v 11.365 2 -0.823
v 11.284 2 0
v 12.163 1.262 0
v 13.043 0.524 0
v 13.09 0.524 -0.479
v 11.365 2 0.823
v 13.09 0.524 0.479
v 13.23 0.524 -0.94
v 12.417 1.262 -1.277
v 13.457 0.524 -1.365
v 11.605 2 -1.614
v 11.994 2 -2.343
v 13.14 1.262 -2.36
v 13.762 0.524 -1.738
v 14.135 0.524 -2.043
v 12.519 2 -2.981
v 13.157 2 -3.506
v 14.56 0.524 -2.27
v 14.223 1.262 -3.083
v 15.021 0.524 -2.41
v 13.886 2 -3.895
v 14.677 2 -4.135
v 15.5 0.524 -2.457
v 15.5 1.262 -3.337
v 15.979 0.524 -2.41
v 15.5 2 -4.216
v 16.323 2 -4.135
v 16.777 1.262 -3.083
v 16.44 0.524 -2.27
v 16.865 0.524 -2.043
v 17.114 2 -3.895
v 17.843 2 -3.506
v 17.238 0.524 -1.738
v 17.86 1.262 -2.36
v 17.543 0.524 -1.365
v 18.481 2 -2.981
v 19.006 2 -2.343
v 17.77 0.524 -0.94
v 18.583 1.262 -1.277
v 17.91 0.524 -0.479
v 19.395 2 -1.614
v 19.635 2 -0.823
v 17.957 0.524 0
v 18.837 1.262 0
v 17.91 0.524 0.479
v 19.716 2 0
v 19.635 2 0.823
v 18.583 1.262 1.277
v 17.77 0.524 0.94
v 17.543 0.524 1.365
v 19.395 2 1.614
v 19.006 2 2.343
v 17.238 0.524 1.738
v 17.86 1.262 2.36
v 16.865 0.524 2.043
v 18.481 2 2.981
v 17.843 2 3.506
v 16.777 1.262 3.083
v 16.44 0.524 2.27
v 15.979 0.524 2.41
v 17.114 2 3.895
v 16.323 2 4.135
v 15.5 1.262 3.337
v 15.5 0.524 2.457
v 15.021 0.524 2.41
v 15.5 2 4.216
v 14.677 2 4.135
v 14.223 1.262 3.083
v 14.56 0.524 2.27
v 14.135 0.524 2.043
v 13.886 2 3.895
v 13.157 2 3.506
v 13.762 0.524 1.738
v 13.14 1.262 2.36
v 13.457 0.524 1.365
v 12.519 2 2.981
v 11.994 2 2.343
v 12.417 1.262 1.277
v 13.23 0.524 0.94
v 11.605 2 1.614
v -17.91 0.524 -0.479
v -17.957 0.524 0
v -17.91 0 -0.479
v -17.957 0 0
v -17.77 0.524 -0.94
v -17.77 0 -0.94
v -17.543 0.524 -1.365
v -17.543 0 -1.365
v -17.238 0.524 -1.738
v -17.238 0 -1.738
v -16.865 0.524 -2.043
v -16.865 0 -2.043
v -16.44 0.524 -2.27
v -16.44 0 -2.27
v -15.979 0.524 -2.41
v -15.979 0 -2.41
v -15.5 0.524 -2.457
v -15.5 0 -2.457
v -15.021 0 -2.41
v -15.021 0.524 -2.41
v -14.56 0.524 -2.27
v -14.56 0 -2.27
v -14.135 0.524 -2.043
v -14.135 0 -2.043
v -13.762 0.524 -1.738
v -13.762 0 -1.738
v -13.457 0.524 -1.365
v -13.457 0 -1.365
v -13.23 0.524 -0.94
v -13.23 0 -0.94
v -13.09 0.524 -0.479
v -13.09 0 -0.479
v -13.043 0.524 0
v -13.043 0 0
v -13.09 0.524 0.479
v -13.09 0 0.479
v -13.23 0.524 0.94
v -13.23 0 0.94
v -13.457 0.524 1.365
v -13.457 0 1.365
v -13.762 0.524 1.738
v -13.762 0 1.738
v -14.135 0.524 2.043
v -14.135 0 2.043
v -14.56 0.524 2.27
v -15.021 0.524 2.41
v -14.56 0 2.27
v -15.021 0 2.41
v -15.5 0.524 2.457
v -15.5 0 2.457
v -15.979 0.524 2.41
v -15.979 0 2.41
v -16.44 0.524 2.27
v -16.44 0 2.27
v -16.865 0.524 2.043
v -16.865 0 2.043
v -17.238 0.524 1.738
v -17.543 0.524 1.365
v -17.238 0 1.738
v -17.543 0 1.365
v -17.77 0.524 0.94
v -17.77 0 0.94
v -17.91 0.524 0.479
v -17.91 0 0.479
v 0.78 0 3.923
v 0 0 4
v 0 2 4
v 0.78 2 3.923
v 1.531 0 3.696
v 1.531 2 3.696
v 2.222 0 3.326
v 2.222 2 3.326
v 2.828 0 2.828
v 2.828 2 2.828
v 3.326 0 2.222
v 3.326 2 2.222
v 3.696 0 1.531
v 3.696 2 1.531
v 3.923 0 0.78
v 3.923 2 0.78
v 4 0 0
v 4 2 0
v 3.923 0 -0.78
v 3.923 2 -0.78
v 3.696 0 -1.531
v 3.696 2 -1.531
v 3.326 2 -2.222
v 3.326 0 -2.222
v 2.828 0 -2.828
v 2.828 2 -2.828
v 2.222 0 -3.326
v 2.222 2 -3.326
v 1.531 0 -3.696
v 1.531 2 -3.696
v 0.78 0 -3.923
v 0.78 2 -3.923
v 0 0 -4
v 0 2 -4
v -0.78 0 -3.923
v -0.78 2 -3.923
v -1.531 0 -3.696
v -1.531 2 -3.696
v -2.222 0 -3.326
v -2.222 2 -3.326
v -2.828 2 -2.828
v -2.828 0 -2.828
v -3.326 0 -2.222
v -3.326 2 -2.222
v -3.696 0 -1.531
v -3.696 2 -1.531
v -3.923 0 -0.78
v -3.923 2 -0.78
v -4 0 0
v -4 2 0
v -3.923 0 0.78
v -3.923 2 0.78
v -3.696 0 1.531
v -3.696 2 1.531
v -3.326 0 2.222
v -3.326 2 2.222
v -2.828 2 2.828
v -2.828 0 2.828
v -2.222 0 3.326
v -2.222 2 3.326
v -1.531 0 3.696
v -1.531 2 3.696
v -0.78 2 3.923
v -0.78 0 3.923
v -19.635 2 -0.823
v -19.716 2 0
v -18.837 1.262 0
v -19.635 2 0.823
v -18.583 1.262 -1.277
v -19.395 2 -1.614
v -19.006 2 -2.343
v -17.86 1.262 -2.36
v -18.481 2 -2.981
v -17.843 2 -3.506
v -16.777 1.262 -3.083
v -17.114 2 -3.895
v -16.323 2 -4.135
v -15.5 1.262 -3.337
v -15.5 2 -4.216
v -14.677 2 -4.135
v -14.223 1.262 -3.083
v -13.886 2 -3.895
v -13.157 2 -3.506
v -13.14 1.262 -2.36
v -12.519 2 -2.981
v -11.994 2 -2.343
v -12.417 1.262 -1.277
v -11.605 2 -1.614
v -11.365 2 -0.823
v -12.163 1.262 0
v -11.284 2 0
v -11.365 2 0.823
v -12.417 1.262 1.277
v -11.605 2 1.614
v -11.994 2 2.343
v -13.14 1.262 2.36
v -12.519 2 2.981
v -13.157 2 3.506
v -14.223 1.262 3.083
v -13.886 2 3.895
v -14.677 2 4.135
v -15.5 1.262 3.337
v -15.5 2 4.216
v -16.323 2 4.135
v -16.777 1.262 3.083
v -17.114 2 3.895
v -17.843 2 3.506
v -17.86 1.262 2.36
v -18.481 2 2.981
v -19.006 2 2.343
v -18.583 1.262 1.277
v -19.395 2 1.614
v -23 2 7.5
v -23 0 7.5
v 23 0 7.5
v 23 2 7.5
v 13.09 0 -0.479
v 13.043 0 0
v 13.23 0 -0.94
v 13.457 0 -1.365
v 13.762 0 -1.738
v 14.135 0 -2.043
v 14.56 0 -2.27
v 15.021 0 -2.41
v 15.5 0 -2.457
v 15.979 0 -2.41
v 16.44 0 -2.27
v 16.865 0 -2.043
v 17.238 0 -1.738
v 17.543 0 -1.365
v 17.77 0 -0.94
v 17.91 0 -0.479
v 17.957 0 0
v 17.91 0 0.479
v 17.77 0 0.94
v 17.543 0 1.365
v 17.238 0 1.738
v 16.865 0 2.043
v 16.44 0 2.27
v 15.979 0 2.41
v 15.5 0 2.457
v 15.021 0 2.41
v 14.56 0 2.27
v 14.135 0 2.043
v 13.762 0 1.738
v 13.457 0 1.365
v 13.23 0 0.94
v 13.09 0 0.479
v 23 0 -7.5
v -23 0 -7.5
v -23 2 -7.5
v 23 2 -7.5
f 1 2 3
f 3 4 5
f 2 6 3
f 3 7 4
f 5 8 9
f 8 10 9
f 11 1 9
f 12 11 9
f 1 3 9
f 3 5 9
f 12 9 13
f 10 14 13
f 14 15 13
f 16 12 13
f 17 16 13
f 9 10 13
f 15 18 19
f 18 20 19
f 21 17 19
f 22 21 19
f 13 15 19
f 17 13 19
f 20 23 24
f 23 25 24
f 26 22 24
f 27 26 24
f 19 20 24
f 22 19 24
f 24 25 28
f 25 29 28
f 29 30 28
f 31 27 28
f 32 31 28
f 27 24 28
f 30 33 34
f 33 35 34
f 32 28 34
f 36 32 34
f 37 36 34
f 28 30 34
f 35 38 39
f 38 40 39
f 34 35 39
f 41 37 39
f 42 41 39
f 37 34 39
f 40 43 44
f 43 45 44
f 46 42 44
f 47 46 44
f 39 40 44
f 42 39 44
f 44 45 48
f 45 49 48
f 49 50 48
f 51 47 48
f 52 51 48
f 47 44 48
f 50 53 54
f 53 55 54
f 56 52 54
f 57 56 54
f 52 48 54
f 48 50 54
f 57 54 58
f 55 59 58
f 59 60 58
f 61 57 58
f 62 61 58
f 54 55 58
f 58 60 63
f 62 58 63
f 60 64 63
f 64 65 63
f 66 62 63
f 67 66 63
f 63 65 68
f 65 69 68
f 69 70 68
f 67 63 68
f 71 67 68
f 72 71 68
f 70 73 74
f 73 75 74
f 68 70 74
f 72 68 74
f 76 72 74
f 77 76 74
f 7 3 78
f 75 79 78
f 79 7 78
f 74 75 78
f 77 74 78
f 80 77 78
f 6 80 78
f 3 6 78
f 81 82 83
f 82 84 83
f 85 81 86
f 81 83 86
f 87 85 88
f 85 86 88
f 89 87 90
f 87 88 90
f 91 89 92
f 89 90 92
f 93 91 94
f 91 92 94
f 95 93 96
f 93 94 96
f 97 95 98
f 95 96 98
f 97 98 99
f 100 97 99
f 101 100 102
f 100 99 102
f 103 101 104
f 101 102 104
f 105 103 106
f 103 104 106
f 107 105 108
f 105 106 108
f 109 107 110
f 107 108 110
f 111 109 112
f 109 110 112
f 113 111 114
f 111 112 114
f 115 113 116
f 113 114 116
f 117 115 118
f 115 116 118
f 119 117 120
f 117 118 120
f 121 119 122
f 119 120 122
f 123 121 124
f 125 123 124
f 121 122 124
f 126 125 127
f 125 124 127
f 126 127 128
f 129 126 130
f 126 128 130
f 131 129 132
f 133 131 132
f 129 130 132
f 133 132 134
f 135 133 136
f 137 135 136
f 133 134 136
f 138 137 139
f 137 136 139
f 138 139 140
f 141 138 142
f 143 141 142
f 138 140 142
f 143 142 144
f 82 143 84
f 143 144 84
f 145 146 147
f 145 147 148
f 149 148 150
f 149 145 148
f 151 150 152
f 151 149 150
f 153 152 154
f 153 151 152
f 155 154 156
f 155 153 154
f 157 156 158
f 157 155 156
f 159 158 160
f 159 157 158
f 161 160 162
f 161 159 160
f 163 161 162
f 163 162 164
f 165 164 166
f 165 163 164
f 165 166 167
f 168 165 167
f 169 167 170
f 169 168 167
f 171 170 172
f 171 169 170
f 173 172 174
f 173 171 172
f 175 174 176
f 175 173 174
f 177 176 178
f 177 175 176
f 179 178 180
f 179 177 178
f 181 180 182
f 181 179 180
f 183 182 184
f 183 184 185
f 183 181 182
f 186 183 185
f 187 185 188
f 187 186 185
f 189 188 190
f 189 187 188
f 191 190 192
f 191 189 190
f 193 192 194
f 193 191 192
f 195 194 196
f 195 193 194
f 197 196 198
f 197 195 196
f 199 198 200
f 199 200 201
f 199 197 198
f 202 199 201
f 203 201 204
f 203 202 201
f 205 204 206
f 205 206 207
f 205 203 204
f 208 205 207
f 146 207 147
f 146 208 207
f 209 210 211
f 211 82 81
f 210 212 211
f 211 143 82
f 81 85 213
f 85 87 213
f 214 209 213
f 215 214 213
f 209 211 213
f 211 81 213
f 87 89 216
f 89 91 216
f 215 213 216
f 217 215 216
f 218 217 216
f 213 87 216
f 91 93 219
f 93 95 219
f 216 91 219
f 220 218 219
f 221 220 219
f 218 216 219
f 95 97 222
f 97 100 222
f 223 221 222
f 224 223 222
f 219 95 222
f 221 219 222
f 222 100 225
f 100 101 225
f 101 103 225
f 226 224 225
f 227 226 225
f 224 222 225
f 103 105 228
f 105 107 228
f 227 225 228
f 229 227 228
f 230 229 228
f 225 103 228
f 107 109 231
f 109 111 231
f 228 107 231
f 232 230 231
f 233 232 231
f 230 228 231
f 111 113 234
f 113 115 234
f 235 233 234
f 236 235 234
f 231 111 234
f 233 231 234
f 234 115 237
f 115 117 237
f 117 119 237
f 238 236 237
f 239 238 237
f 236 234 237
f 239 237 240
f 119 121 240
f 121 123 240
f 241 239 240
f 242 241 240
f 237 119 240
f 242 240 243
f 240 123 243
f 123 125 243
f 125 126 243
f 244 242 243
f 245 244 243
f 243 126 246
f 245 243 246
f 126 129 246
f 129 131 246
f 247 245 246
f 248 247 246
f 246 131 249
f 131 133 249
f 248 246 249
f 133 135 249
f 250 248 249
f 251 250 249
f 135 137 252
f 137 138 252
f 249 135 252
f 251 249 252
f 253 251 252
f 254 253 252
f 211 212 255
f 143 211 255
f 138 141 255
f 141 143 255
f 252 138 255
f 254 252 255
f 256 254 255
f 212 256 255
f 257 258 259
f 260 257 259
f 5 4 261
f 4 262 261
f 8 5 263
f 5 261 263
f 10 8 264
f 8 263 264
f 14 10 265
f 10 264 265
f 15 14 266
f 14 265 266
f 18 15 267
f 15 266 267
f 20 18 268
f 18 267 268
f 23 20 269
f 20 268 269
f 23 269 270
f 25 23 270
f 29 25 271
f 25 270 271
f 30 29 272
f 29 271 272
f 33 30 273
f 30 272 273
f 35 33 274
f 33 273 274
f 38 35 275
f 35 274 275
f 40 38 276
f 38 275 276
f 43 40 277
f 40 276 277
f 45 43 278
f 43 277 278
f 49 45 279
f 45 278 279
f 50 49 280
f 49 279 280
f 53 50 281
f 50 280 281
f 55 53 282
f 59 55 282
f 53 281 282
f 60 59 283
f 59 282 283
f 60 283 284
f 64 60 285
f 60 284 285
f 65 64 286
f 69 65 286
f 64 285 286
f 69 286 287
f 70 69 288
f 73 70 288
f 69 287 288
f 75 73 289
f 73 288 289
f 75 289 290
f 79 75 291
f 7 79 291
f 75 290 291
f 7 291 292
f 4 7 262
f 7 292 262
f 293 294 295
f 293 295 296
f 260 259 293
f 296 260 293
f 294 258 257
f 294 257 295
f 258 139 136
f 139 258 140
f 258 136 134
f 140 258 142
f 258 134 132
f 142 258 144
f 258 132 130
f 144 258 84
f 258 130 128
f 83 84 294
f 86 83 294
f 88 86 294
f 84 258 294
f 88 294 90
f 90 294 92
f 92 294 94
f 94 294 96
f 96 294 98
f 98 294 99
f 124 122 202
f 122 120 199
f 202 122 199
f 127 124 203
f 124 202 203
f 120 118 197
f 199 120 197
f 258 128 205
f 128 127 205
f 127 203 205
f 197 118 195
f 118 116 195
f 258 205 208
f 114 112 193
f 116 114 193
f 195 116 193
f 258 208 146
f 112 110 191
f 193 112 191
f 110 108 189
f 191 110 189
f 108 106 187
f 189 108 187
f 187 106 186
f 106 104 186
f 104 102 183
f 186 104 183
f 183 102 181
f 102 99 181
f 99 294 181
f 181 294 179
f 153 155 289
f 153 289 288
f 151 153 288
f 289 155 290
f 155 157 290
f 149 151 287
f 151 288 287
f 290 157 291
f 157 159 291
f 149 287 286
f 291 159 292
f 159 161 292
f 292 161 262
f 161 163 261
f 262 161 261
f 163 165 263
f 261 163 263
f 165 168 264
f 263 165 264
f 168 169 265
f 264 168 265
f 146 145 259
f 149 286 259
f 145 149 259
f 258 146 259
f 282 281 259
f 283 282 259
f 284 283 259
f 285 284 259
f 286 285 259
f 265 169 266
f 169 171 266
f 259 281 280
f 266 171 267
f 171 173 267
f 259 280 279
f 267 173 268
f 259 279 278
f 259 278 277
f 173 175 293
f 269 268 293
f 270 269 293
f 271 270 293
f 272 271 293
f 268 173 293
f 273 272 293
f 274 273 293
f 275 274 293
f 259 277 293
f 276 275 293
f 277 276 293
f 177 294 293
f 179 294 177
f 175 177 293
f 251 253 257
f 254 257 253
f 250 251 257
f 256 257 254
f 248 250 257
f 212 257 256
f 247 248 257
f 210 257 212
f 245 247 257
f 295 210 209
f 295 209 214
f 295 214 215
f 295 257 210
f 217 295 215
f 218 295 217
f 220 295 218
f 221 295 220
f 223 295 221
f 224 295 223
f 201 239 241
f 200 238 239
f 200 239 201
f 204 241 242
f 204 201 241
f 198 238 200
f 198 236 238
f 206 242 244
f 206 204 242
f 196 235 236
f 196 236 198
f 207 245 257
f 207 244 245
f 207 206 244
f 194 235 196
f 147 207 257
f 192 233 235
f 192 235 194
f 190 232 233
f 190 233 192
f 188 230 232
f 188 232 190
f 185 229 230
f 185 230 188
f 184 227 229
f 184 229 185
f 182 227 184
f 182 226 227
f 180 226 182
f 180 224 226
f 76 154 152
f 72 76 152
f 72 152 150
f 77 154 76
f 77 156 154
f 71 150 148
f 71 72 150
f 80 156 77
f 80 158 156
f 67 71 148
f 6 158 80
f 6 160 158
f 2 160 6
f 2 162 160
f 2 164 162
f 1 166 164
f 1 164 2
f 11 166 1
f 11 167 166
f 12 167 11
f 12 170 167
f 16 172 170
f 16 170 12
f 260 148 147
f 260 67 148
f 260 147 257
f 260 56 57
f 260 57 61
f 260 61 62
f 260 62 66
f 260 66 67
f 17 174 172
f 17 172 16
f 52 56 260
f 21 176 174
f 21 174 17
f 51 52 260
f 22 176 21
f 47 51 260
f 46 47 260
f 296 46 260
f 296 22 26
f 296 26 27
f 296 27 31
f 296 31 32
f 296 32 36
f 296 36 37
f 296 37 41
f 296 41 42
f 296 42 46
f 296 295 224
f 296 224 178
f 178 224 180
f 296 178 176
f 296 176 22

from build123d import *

# Parameters (mm, degrees)
SKETCH1_W                                         = 46
SKETCH1_H                                         = 15
SKETCH1_R                                         = 4
BOSS_EXTRUDE1_DEPTH                               = 2
CSK_FOR_8_FLAT_HEAD_MACHINE_SCREW_100_D           = 4.9149
CSK_FOR_8_FLAT_HEAD_MACHINE_SCREW_100_DEPTH       = 25
CSK_FOR_8_FLAT_HEAD_MACHINE_SCREW_100_CSINK_D     = 8.4328
CSK_FOR_8_FLAT_HEAD_MACHINE_SCREW_100_CSINK_ANGLE = 100
CSK_FOR_8_FLAT_HEAD_MACHINE_SCREW_100_TIP         = 1.476584928


with BuildPart() as part:
    # Sketch1 → Boss-Extrude1 (new body)
    with BuildSketch(Plane(origin=(0, 0, 0), x_dir=(1, 0, 0), z_dir=(0, 1, 0))):
        Rectangle(SKETCH1_W, SKETCH1_H)
        with Locations(Location((0, 0, 0), (0, 0, 270))):
            Circle(SKETCH1_R, mode=Mode.SUBTRACT)
    extrude(amount=BOSS_EXTRUDE1_DEPTH)

    # CSK for #8 Flat Head Machine Screw (100)1
    with Locations(Plane(origin=(0, 2, 0), x_dir=(1, 0, 0), z_dir=(0, 1, 0))):
        with Locations((-15.5, 0), (15.5, 0)):
            CounterSinkHole(CSK_FOR_8_FLAT_HEAD_MACHINE_SCREW_100_D / 2, CSK_FOR_8_FLAT_HEAD_MACHINE_SCREW_100_CSINK_D / 2, depth=CSK_FOR_8_FLAT_HEAD_MACHINE_SCREW_100_DEPTH, counter_sink_angle=CSK_FOR_8_FLAT_HEAD_MACHINE_SCREW_100_CSINK_ANGLE)
            with Locations((0, 0, -(CSK_FOR_8_FLAT_HEAD_MACHINE_SCREW_100_DEPTH + CSK_FOR_8_FLAT_HEAD_MACHINE_SCREW_100_TIP / 2))):  # 118° drill point
                Cone(0, CSK_FOR_8_FLAT_HEAD_MACHINE_SCREW_100_D / 2, CSK_FOR_8_FLAT_HEAD_MACHINE_SCREW_100_TIP, mode=Mode.SUBTRACT)


solid = part.part
